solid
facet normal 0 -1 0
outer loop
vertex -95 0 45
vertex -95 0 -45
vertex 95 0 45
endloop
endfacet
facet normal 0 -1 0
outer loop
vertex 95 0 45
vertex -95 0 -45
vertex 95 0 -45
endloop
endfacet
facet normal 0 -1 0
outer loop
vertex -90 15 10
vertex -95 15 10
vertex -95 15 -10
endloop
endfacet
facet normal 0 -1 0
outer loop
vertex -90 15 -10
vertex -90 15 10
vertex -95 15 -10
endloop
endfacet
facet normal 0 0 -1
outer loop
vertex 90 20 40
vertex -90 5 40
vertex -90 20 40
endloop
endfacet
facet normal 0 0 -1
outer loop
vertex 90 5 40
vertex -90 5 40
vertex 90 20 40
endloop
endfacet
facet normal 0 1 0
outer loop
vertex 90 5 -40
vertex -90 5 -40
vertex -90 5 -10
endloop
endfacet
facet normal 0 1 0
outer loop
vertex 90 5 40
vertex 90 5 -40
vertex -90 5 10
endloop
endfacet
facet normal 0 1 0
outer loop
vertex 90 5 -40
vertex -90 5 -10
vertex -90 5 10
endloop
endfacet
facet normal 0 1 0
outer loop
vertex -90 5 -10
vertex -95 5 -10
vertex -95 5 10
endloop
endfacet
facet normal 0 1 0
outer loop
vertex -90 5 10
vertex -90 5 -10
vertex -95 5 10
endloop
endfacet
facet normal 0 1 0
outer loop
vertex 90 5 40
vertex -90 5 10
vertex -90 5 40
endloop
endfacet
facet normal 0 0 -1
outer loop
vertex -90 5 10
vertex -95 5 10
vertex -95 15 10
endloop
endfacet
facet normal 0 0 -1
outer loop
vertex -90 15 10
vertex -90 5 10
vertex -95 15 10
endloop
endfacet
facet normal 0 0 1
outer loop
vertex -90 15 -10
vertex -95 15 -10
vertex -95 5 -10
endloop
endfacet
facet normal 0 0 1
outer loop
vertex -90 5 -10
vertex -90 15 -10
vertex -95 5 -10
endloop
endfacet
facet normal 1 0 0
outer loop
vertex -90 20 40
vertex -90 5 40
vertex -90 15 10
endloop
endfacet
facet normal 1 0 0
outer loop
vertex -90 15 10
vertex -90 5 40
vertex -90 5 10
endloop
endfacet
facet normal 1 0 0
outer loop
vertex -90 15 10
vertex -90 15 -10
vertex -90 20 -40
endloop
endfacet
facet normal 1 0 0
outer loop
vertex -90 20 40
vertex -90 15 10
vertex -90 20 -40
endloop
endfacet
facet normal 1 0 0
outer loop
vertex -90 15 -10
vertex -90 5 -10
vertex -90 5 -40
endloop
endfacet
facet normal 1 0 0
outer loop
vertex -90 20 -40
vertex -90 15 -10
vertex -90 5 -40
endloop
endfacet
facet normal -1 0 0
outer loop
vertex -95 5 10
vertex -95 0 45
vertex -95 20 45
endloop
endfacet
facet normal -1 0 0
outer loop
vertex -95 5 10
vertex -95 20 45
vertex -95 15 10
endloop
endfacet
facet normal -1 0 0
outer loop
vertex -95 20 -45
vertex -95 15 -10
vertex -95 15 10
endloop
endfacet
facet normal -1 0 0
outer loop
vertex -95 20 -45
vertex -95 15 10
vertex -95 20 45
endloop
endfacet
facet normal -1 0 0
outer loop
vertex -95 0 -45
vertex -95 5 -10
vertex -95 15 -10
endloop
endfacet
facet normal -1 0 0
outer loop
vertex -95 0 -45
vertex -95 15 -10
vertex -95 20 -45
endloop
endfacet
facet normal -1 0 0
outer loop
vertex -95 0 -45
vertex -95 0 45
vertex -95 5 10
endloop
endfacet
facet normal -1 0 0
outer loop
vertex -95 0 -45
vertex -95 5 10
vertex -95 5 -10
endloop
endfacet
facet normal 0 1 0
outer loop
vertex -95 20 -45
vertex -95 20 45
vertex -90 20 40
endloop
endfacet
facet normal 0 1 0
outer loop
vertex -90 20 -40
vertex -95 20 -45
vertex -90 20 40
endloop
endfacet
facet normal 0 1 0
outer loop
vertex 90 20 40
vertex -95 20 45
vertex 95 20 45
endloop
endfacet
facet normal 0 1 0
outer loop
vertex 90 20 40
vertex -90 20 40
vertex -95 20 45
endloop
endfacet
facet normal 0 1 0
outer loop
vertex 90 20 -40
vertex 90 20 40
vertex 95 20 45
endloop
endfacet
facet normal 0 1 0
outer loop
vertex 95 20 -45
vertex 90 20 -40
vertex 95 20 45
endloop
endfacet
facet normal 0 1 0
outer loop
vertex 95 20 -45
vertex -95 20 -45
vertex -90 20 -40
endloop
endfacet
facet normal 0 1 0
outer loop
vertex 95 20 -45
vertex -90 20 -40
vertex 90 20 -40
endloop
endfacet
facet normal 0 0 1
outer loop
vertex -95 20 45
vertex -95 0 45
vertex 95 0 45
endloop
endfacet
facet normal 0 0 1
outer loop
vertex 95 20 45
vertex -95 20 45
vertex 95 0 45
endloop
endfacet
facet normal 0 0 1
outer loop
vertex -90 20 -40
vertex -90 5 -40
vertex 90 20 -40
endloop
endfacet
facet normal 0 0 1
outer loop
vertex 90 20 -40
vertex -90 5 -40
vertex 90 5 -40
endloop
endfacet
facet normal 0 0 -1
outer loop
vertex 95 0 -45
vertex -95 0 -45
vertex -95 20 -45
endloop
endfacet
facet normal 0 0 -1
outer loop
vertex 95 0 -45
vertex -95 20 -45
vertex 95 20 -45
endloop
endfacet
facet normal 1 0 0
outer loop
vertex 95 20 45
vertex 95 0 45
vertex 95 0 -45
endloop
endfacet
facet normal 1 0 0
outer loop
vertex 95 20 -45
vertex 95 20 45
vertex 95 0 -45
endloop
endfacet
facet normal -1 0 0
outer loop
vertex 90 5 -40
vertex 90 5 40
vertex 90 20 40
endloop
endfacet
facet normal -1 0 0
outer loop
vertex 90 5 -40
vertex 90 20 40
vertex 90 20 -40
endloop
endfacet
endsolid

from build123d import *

# Parameters (mm, degrees)
SKETCH3_W           = 190
SKETCH3_H           = 90
BOSS_EXTRUDE2_DEPTH = 20
SKETCH3_4_W         = 180
SKETCH3_4_H         = 80
BOSS_EXTRUDE3_DEPTH = 5
SKETCH4_W           = 20
SKETCH4_H           = 10
CUT_EXTRUDE1_DEPTH  = 5


with BuildPart() as part:
    # Sketch3 → Boss-Extrude2 (new body)
    with BuildSketch(Plane(origin=(0, 0, 0), x_dir=(1, 0, 0), z_dir=(0, 1, 0))):
        Rectangle(SKETCH3_W, SKETCH3_H)
        Polygon((-90, -40), (-90, 5), (-90, 40), (-20, 40), (90, 40), (90, -15), (90, -40), (65, -40), align=None, mode=Mode.SUBTRACT)
    extrude(amount=BOSS_EXTRUDE2_DEPTH)

    # Sketch3<4> → Boss-Extrude3 (add)
    with BuildSketch(Plane(origin=(0, 0, 0), x_dir=(1, 0, 0), z_dir=(0, 1, 0))):
        Rectangle(SKETCH3_4_W, SKETCH3_4_H)
    extrude(amount=BOSS_EXTRUDE3_DEPTH)

    # Sketch4 → Cut-Extrude1 (cut)
    with BuildSketch(Plane.ZY.offset(95)):
        with Locations((0, 10)):
            Rectangle(SKETCH4_W, SKETCH4_H)
    extrude(amount=-CUT_EXTRUDE1_DEPTH, mode=Mode.SUBTRACT)


solid = part.part
